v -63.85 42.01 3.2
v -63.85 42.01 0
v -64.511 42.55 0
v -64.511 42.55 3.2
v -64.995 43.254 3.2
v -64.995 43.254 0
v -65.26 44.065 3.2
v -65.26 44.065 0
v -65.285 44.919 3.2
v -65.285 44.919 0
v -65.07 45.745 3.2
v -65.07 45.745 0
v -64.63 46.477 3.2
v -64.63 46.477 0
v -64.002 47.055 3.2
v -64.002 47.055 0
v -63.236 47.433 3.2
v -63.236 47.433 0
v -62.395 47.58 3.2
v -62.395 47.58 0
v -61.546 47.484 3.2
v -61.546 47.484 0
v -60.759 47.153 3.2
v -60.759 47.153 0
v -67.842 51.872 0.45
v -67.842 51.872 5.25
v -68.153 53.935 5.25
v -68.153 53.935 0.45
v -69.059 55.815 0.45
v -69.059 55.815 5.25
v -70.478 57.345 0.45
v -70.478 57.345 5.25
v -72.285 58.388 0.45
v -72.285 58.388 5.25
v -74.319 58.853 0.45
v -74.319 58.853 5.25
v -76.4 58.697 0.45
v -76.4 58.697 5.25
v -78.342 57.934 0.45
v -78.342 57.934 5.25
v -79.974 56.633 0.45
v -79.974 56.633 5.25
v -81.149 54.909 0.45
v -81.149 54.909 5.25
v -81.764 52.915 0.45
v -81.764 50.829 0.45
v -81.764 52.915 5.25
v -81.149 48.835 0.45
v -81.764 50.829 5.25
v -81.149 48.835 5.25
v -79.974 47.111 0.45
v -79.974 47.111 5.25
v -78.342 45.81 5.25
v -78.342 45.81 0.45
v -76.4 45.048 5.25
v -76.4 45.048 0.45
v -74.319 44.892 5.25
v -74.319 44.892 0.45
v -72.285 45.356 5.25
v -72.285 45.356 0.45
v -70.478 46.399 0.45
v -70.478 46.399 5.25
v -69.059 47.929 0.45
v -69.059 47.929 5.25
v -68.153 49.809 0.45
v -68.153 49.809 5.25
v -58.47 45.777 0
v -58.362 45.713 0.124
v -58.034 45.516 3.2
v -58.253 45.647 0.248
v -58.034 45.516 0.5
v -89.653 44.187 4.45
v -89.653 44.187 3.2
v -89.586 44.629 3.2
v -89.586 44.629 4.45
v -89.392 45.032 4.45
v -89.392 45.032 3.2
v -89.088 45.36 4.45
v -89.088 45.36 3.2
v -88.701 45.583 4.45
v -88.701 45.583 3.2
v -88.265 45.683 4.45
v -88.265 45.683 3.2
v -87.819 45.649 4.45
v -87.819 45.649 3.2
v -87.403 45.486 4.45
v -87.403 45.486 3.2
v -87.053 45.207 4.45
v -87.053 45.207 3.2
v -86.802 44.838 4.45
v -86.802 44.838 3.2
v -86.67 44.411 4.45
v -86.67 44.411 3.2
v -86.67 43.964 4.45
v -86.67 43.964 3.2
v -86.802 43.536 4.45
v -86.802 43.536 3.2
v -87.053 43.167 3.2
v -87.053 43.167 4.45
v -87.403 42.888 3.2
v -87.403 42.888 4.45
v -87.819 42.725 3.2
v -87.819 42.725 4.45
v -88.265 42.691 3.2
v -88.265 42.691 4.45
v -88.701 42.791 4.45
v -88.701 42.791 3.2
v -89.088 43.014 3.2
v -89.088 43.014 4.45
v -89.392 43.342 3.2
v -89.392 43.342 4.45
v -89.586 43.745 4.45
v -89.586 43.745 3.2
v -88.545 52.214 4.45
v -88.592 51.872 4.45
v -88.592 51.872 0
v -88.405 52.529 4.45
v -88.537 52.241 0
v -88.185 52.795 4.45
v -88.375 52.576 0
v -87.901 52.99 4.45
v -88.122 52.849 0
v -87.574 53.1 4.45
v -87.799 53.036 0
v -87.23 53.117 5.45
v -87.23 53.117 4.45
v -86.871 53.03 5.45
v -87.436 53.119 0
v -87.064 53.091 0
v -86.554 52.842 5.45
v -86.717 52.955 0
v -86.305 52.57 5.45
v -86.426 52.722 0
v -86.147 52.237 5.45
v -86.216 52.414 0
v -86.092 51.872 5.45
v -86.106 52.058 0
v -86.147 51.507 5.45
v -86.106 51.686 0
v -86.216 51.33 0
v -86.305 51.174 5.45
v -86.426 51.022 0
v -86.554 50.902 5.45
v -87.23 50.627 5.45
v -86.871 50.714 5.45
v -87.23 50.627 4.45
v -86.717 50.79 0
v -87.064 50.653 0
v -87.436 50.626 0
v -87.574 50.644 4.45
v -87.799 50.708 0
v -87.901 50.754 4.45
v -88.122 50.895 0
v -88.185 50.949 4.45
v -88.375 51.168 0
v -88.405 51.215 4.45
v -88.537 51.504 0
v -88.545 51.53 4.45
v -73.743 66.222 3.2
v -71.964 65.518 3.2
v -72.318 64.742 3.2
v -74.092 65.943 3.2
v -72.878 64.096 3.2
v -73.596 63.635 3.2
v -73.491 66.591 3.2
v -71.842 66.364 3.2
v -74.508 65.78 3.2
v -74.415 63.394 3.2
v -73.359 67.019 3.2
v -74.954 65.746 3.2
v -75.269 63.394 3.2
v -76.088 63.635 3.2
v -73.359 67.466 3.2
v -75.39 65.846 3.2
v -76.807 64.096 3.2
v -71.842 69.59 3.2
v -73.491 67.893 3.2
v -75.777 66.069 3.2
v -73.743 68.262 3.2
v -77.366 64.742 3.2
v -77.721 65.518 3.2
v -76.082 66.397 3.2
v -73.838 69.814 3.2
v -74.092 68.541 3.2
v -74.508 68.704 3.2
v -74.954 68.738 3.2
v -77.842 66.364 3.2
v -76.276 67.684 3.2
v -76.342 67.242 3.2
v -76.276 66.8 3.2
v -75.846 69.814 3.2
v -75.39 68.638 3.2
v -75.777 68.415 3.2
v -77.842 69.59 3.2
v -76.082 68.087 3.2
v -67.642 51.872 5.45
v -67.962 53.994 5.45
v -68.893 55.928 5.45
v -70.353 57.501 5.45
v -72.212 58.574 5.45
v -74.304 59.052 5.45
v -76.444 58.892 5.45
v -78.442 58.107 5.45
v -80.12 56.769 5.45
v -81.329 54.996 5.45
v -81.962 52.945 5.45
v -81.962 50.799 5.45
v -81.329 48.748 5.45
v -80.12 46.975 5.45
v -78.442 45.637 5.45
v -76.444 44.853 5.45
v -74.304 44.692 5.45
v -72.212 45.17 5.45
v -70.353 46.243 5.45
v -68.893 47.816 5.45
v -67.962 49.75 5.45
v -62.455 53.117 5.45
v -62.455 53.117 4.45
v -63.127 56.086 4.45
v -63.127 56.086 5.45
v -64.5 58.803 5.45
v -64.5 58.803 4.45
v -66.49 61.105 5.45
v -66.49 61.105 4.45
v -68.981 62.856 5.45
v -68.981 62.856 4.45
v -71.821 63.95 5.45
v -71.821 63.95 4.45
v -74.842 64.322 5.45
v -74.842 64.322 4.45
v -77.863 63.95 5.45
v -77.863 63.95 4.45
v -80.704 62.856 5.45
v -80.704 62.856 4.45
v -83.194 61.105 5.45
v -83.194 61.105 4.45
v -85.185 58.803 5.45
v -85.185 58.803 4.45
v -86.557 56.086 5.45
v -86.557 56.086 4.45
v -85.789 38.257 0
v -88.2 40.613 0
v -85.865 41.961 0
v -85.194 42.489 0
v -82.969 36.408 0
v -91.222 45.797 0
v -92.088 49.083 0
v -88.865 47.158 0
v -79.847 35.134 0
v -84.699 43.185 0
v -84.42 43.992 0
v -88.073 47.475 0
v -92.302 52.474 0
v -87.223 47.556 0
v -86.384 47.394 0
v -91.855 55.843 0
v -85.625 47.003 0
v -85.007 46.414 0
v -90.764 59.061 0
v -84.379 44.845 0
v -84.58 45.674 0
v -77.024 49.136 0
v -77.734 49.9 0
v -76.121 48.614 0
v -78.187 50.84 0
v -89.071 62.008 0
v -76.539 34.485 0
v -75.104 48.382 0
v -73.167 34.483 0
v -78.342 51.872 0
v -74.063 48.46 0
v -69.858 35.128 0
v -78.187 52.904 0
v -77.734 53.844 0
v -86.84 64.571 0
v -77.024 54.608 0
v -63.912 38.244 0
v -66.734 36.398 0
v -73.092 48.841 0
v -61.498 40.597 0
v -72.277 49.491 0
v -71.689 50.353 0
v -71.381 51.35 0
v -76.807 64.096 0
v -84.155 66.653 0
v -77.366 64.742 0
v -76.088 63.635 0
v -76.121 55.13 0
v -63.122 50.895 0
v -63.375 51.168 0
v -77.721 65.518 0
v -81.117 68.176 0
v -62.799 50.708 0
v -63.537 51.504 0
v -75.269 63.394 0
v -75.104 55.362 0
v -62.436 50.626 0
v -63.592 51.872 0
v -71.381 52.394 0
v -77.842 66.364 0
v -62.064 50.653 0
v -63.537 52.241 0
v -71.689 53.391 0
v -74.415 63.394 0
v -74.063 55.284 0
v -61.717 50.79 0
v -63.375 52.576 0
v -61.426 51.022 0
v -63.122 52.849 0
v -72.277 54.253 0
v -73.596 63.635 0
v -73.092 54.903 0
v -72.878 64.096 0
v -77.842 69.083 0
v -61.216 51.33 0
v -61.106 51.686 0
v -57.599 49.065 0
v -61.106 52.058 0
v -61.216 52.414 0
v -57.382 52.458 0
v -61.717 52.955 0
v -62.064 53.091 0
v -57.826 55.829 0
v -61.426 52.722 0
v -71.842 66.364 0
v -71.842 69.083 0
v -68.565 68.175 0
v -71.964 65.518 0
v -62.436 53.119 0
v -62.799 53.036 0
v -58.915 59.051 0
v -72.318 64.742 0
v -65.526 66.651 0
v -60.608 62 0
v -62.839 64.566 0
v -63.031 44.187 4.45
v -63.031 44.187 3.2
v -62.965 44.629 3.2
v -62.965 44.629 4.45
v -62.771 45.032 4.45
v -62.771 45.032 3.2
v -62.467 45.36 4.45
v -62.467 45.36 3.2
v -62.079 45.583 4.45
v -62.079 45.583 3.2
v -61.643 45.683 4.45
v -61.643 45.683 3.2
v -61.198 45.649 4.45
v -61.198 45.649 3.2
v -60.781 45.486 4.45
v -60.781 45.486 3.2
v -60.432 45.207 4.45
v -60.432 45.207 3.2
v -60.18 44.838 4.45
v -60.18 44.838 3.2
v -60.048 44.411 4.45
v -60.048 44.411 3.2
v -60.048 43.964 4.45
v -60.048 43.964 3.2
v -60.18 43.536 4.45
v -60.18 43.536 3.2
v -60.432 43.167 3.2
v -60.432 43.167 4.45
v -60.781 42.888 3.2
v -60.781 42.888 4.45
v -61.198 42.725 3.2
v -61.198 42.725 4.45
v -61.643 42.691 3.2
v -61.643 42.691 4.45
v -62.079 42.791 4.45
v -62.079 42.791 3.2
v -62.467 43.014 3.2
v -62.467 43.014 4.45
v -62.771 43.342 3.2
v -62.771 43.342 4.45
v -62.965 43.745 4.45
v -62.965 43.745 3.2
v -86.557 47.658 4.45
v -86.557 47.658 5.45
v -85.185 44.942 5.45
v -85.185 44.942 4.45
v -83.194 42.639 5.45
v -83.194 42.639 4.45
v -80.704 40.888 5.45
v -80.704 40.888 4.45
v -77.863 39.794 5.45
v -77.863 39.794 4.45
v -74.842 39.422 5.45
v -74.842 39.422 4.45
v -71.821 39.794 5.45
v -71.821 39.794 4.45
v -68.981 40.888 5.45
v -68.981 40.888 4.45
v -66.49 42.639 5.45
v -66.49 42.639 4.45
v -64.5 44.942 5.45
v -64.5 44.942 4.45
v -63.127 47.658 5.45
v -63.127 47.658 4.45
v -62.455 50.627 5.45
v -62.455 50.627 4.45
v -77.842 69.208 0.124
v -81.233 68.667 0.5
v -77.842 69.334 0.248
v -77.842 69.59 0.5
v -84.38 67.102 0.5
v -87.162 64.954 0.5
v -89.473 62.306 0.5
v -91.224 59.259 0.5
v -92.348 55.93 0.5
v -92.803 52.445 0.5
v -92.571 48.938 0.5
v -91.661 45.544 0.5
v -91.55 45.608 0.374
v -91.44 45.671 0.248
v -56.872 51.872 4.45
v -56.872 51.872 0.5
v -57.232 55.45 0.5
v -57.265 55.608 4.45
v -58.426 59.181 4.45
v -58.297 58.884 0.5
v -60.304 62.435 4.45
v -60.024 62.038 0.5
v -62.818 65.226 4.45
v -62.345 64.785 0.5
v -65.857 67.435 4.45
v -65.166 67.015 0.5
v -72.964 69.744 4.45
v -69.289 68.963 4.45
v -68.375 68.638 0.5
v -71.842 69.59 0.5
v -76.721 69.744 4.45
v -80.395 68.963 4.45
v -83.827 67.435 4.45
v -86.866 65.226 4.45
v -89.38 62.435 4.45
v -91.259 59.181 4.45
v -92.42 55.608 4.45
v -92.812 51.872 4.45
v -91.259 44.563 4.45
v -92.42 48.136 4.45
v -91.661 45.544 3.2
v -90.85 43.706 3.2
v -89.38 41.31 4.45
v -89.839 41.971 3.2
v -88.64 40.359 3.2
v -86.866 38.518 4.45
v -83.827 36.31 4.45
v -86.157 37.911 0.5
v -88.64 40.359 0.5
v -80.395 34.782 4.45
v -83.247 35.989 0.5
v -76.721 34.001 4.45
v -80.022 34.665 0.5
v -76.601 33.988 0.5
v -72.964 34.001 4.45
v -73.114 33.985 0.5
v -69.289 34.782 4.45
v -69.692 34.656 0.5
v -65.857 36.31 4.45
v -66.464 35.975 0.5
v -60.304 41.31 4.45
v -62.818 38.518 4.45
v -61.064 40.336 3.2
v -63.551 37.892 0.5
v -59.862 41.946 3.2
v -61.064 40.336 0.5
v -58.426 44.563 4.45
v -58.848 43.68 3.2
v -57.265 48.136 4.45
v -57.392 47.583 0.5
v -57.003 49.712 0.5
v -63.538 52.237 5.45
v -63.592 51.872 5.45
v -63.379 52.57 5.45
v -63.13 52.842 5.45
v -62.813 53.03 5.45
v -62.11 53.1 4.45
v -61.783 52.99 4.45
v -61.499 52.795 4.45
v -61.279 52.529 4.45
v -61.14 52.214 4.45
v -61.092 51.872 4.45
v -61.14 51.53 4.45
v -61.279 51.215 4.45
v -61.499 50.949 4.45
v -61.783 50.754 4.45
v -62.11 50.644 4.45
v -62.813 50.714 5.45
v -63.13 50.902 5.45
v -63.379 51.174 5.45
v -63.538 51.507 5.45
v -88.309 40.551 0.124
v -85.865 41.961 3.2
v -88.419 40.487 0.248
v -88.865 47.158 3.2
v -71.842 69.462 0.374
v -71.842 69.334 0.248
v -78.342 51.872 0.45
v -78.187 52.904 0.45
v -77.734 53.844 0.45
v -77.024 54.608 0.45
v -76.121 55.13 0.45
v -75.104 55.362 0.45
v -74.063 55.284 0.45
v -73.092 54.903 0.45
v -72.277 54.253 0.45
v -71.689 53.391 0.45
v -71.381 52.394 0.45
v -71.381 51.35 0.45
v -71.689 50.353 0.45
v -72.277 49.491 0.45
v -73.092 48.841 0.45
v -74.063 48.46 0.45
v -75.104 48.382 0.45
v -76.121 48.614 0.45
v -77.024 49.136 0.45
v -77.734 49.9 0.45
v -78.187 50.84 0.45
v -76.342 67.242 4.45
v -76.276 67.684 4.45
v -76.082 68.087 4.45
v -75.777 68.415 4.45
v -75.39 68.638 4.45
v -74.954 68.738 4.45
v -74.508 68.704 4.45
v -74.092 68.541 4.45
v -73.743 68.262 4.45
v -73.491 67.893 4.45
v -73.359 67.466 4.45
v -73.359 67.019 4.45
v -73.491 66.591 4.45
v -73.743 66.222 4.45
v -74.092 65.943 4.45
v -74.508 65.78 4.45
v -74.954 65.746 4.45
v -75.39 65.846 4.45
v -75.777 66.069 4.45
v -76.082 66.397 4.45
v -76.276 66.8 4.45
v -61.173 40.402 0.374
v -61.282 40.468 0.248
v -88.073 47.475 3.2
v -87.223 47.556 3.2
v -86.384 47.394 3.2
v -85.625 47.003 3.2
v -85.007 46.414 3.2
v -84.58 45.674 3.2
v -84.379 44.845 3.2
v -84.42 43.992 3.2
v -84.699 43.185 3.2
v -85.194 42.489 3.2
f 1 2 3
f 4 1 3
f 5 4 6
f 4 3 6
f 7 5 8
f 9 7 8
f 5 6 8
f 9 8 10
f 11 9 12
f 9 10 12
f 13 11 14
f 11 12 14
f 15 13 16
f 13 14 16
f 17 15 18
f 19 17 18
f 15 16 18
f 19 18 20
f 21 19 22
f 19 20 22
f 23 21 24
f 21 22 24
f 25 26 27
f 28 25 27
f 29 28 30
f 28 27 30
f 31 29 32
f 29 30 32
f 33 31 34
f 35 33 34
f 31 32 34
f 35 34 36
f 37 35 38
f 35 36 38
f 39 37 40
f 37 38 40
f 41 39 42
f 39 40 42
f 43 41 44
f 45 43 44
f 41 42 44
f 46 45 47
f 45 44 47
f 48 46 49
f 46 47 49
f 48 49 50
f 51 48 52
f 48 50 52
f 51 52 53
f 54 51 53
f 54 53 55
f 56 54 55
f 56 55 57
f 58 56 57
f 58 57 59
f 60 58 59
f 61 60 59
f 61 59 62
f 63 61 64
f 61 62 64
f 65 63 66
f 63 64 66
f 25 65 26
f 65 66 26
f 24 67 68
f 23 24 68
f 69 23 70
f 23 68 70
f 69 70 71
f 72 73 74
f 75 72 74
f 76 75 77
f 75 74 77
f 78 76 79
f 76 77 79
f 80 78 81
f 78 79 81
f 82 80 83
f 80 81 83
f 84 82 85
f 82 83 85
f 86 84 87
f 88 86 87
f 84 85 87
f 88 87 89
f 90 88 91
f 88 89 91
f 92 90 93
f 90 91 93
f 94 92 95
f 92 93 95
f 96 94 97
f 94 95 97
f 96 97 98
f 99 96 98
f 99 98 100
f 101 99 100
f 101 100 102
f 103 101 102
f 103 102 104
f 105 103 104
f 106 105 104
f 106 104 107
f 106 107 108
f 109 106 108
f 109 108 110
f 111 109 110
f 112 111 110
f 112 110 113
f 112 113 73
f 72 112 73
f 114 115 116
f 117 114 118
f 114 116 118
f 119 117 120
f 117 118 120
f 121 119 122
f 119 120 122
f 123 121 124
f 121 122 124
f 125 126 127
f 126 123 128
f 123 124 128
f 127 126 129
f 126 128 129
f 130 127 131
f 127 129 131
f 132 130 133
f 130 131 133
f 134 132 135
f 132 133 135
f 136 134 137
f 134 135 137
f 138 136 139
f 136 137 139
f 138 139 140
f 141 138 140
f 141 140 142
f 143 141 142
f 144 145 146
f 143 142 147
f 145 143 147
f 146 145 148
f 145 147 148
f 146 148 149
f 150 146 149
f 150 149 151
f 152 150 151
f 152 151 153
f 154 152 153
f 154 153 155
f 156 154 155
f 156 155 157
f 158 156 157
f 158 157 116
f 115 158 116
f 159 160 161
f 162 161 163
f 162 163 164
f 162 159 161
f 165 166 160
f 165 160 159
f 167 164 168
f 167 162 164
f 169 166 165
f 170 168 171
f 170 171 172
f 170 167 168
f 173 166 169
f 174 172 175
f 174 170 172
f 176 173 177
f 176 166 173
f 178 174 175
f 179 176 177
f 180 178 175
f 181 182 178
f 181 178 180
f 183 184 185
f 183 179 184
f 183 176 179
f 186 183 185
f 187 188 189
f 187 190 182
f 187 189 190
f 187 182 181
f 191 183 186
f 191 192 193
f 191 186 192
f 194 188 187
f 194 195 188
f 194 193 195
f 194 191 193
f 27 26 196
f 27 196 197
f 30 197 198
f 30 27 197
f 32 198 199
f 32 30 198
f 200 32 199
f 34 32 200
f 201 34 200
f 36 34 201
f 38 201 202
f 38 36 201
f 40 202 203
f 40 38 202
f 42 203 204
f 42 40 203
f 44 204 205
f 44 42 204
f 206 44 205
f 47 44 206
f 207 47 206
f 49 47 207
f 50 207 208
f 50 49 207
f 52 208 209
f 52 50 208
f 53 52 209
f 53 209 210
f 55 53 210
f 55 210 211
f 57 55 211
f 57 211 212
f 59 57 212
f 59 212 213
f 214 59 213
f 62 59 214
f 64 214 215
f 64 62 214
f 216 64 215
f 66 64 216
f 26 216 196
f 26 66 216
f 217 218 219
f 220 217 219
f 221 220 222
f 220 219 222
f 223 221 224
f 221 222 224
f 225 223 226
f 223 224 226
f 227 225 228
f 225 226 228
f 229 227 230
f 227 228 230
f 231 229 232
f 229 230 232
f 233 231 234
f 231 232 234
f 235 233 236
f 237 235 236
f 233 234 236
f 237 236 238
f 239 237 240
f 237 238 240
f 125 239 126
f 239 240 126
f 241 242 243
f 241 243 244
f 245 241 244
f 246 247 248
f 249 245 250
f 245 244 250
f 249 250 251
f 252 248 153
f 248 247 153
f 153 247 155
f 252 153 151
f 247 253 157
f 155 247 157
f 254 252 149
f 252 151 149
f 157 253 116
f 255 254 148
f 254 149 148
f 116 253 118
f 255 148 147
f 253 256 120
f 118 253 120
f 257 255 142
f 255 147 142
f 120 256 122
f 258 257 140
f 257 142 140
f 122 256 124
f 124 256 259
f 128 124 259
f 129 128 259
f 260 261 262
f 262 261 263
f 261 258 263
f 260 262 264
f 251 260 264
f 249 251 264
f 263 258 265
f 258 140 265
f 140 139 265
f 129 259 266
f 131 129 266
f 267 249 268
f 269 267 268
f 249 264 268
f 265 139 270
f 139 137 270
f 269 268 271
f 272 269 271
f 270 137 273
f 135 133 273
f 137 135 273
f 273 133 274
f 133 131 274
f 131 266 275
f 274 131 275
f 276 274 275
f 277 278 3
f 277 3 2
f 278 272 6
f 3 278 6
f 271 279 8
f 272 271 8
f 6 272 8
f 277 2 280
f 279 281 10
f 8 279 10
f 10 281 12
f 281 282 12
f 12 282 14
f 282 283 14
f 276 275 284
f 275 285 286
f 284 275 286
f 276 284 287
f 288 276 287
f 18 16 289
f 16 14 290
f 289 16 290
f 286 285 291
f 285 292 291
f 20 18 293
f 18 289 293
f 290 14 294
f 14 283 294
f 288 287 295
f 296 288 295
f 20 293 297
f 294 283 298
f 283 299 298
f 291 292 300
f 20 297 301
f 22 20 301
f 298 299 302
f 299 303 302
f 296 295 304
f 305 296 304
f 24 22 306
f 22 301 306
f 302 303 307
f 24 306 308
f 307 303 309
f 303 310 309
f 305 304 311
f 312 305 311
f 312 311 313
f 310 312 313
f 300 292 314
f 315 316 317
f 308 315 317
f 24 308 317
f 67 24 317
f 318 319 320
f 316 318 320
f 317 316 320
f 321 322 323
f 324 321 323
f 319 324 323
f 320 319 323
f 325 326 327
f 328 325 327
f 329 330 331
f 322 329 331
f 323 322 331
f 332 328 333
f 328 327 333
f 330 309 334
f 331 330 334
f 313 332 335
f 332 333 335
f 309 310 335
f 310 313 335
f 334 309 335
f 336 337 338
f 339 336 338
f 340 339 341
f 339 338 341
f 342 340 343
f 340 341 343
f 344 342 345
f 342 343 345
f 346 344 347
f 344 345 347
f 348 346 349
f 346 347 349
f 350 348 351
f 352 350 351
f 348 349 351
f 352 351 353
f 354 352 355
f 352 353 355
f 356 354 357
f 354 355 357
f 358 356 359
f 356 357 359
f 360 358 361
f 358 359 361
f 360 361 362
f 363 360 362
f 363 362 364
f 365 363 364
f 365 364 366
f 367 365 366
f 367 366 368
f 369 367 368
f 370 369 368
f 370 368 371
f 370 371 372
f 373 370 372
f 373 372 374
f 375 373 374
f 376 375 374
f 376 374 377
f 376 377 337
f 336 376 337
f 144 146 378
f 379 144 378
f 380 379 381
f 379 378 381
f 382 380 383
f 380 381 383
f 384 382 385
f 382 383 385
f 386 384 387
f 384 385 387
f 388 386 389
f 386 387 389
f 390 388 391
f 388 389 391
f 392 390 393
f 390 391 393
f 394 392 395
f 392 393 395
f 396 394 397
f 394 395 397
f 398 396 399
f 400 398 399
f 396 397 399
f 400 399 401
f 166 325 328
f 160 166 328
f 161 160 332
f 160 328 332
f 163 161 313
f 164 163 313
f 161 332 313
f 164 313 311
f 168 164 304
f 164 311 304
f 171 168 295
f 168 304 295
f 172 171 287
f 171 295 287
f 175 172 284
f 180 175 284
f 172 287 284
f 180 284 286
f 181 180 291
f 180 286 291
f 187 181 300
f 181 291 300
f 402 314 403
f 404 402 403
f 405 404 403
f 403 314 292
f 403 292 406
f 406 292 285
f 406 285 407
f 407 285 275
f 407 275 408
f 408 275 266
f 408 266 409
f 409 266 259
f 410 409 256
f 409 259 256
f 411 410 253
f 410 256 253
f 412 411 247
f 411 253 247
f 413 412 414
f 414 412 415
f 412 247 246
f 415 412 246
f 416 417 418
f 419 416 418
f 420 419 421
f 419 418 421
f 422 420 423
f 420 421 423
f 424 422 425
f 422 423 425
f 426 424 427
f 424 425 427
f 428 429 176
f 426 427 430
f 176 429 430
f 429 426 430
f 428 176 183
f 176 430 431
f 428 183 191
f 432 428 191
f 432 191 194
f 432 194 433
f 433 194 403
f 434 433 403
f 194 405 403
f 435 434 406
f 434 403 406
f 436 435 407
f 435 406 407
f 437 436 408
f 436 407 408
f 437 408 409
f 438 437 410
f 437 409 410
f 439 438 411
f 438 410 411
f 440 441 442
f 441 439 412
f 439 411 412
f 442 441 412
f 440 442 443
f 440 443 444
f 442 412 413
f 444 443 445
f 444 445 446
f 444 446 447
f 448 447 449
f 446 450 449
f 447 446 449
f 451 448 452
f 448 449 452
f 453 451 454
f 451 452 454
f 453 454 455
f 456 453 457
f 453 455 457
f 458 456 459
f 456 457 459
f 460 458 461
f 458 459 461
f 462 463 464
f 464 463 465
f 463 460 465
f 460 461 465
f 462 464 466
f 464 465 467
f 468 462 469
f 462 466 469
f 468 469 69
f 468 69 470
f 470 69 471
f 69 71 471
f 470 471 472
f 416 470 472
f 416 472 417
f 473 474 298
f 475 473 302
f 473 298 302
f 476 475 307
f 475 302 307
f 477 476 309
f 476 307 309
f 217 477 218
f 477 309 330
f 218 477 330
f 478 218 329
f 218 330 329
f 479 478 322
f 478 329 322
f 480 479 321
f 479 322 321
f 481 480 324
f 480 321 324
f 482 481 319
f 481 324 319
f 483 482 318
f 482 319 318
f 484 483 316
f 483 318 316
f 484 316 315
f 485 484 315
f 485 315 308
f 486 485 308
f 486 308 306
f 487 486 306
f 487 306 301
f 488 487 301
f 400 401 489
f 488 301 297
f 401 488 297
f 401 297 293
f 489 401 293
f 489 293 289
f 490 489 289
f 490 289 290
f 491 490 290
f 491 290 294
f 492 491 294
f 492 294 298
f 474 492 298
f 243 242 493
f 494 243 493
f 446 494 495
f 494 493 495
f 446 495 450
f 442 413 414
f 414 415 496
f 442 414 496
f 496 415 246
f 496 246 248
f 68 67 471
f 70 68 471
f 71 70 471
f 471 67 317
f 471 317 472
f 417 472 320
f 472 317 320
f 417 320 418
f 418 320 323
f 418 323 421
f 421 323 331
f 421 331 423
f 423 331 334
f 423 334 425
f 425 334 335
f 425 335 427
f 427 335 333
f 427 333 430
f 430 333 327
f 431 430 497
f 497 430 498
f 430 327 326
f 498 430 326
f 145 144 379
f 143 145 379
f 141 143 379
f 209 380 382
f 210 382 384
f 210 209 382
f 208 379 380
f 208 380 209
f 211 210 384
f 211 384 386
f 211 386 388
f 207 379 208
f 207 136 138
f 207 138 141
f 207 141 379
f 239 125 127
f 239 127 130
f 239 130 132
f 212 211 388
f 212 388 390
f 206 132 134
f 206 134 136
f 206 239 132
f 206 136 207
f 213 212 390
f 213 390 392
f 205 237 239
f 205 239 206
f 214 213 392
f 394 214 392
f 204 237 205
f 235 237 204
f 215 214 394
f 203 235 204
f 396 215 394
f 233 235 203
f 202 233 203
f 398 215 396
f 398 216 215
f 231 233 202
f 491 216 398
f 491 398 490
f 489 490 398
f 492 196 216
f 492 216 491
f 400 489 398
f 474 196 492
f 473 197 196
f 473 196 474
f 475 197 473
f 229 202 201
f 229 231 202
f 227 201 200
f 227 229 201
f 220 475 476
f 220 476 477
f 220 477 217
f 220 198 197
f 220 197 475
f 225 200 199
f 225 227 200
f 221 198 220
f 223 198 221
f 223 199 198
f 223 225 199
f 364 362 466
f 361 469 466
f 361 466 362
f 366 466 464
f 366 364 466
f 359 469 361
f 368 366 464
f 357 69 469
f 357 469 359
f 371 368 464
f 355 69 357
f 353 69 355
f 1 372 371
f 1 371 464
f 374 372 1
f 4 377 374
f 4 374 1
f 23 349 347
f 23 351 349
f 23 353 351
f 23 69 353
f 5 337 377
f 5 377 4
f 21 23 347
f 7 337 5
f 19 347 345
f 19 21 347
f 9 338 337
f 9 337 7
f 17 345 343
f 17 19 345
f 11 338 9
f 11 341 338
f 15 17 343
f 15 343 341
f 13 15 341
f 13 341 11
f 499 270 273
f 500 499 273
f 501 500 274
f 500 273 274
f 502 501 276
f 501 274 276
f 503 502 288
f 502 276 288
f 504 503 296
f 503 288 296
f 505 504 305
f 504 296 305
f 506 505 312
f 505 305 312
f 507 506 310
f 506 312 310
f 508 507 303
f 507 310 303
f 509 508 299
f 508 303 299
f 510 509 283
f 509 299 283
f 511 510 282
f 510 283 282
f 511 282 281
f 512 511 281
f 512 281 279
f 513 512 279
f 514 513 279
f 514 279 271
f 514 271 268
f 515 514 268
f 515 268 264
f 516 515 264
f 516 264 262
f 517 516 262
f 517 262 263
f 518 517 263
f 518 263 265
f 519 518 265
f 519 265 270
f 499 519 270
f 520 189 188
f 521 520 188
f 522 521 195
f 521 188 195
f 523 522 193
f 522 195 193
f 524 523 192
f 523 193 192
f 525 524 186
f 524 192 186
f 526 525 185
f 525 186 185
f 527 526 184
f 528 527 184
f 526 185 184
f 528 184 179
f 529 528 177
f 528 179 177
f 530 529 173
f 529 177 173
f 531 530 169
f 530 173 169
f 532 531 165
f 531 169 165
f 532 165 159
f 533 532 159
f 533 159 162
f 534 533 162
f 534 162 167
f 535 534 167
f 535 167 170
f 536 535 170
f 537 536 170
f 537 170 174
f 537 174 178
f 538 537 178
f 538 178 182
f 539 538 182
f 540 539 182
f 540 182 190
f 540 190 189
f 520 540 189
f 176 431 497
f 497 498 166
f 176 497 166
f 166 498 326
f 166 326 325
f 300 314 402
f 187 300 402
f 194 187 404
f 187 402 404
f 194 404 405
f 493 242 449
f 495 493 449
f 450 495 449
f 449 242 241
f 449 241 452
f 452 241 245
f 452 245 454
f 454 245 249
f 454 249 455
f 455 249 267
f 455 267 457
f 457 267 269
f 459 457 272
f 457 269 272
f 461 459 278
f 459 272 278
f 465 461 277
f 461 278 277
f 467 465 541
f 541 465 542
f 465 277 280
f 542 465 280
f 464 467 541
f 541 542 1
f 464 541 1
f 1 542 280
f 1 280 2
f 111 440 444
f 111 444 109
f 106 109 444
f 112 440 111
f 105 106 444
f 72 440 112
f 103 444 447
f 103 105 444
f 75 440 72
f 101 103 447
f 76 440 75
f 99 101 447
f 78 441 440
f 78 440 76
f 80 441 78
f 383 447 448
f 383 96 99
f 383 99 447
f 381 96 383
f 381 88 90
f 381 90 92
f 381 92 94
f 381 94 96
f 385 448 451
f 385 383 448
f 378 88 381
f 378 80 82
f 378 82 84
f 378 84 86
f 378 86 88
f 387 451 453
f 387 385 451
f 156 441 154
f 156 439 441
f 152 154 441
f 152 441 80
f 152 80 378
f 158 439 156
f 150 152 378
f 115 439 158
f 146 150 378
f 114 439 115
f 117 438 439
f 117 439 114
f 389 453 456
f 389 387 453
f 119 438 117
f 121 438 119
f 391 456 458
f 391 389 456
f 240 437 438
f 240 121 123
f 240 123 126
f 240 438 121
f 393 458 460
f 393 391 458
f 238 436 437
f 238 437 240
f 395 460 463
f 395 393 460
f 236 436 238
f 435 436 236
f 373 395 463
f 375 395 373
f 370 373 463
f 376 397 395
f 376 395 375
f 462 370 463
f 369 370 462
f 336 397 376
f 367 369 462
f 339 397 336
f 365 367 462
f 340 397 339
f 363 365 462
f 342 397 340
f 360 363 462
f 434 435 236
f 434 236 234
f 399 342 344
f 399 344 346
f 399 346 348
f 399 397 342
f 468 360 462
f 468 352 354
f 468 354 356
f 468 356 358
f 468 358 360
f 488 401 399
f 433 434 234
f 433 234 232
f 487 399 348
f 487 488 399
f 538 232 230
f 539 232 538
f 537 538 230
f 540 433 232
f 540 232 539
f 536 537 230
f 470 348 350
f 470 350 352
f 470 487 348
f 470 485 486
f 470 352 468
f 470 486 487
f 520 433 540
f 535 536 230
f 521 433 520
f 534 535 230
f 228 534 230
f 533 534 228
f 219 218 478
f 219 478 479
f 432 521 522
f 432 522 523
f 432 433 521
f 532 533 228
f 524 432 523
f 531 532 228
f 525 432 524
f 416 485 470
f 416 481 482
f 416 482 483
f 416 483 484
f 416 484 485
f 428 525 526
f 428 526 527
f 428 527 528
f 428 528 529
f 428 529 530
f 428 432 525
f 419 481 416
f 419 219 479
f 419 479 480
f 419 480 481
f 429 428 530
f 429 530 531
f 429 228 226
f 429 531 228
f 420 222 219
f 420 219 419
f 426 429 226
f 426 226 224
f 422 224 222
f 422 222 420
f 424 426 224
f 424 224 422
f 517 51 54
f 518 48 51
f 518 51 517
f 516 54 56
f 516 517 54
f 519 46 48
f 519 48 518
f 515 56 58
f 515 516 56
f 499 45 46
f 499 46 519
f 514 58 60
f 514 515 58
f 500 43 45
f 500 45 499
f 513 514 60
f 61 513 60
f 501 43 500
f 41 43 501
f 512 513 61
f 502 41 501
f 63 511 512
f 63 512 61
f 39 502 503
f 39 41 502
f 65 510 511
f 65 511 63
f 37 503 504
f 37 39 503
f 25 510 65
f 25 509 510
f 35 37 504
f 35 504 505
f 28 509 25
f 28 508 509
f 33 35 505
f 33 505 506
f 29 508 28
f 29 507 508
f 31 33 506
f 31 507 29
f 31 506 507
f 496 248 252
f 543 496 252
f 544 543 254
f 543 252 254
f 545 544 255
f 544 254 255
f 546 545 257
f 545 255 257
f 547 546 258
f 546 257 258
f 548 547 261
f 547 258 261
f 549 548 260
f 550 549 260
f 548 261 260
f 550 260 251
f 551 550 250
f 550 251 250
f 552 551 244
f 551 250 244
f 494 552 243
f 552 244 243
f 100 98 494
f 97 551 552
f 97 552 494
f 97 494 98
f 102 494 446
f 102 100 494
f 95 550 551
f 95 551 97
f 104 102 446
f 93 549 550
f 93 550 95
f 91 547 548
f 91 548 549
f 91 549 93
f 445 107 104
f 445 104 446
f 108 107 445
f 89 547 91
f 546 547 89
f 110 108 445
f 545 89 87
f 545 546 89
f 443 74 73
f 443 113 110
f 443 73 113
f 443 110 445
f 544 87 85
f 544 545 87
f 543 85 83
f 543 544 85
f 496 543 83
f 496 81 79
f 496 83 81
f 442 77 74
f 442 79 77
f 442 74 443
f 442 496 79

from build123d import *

# Parameters (mm, degrees)
ESQUISSE1_R             = 17.97
BOSS_EXTRU_1_DEPTH      = 4.45
ESQUISSE2_R             = 12.45
BOSS_EXTRU_2_DEPTH      = 1
CHANFREIN1_SIZE         = 0.5
ESQUISSE5_R             = 1.5
ENL_V_MAT_EXTRU_1_DEPTH = 6.45
ESQUISSE6_R             = 3.5
ENL_V_MAT_EXTRU_2_DEPTH = 6.45
ESQUISSE7_R             = 7
ENL_V_MAT_EXTRU_3_DEPTH = 5
ENL_V_MAT_EXTRU_4_DEPTH = 3.2
CHANFREIN2_SIZE         = 0.2
ESQUISSE9_R             = 1.25
ENL_V_MAT_EXTRU_5_DEPTH = 6.45


with BuildPart() as part:
    # Esquisse1 → Boss.-Extru.1 (new body)
    with BuildSketch(Plane.XY):
        with Locations((-74.842203198, 51.872077922)):
            Circle(ESQUISSE1_R)
    extrude(amount=BOSS_EXTRU_1_DEPTH)

    # Esquisse2 → Boss.-Extru.2 (add)
    with BuildSketch(Plane.XY.offset(4.45)):
        with Locations((-74.842203198, 51.872077922)):
            Circle(ESQUISSE2_R)
    extrude(amount=BOSS_EXTRU_2_DEPTH)

    # Chanfrein1
    chanfrein1_edges = [part.edges().sort_by_distance(p)[0] for p in [
        (-92.812203198, 51.872077922, 0),
    ]]
    chamfer(chanfrein1_edges, length=CHANFREIN1_SIZE)

    # Esquisse5 → Enlèv. mat.-Extru.1 (cut, through all)
    with BuildSketch(Plane(origin=(0, 0, 0), x_dir=(-1, 0, 0), z_dir=(0, 0, -1))):
        with Locations((74.842203198, 67.242077922)):
            Circle(ESQUISSE5_R)
        with Locations((61.531392742, 44.187077922)):
            Circle(ESQUISSE5_R)
        with Locations((88.153013654, 44.187077922)):
            Circle(ESQUISSE5_R)
    extrude(amount=-ENL_V_MAT_EXTRU_1_DEPTH, mode=Mode.SUBTRACT)

    # Esquisse6 → Enlèv. mat.-Extru.2 (cut, through all)
    with BuildSketch(Plane(origin=(0, 0, 0), x_dir=(-1, 0, 0), z_dir=(0, 0, -1))):
        with Locations((74.842203198, 51.872077922)):
            Circle(ESQUISSE6_R)
    extrude(amount=-ENL_V_MAT_EXTRU_2_DEPTH, mode=Mode.SUBTRACT)

    # Esquisse7 → Enlèv. mat.-Extru.3 (cut)
    with BuildSketch(Plane.XY.offset(5.45)):
        with Locations((-74.842203198, 51.872077922)):
            Circle(ESQUISSE7_R)
    extrude(amount=-ENL_V_MAT_EXTRU_3_DEPTH, mode=Mode.SUBTRACT)

    # Esquisse8 → Enlèv. mat.-Extru.4 (cut)
    with BuildSketch(Plane(origin=(0, 0, 0), x_dir=(-1, 0, 0), z_dir=(0, 0, -1))):
        with BuildLine():
            Line((71.842203198, 70.411905134), (71.842203198, 66.363654544))
            ThreePointArc((71.842203198, 66.363654544), (74.842203198, 63.363654544), (77.842203198, 66.363654544))
            Line((77.842203198, 66.363654544), (77.842203198, 70.411905134))
            Line((77.842203198, 70.411905134), (71.842203198, 70.411905134))
        make_face()
        with BuildLine():
            Line((60.379554388, 39.925212907), (63.849582418, 42.010216097))
            ThreePointArc((63.849582418, 42.010216097), (64.875970095, 46.126832224), (60.759353968, 47.153219901))
            Line((60.759353968, 47.153219901), (57.289325938, 45.068216711))
            Line((57.289325938, 45.068216711), (60.379554388, 39.925212907))
        make_face()
        with BuildLine():
            Line((92.371338943, 45.133431645), (88.865451092, 47.15755694))
            ThreePointArc((88.865451092, 47.15755694), (84.76737488, 46.059480728), (85.865451092, 41.961404517))
            Line((85.865451092, 41.961404517), (89.371338943, 39.937279222))
            Line((89.371338943, 39.937279222), (92.371338943, 45.133431645))
        make_face()
    extrude(amount=-ENL_V_MAT_EXTRU_4_DEPTH, mode=Mode.SUBTRACT)

    # Chanfrein2
    chanfrein2_edges = [part.edges().sort_by_distance(p)[0] for p in [
        (-81.842203198, 51.872077922, 5.45),
    ]]
    chamfer(chanfrein2_edges, length=CHANFREIN2_SIZE)

    # Esquisse9 → Enlèv. mat.-Extru.5 (cut, through all)
    with BuildSketch(Plane(origin=(0, 0, 0), x_dir=(-1, 0, 0), z_dir=(0, 0, -1))):
        with Locations((62.342203198, 51.872077922)):
            Circle(ESQUISSE9_R)
        with Locations((87.342203198, 51.872077922)):
            Circle(ESQUISSE9_R)
    extrude(amount=-ENL_V_MAT_EXTRU_5_DEPTH, mode=Mode.SUBTRACT)


solid = part.part
